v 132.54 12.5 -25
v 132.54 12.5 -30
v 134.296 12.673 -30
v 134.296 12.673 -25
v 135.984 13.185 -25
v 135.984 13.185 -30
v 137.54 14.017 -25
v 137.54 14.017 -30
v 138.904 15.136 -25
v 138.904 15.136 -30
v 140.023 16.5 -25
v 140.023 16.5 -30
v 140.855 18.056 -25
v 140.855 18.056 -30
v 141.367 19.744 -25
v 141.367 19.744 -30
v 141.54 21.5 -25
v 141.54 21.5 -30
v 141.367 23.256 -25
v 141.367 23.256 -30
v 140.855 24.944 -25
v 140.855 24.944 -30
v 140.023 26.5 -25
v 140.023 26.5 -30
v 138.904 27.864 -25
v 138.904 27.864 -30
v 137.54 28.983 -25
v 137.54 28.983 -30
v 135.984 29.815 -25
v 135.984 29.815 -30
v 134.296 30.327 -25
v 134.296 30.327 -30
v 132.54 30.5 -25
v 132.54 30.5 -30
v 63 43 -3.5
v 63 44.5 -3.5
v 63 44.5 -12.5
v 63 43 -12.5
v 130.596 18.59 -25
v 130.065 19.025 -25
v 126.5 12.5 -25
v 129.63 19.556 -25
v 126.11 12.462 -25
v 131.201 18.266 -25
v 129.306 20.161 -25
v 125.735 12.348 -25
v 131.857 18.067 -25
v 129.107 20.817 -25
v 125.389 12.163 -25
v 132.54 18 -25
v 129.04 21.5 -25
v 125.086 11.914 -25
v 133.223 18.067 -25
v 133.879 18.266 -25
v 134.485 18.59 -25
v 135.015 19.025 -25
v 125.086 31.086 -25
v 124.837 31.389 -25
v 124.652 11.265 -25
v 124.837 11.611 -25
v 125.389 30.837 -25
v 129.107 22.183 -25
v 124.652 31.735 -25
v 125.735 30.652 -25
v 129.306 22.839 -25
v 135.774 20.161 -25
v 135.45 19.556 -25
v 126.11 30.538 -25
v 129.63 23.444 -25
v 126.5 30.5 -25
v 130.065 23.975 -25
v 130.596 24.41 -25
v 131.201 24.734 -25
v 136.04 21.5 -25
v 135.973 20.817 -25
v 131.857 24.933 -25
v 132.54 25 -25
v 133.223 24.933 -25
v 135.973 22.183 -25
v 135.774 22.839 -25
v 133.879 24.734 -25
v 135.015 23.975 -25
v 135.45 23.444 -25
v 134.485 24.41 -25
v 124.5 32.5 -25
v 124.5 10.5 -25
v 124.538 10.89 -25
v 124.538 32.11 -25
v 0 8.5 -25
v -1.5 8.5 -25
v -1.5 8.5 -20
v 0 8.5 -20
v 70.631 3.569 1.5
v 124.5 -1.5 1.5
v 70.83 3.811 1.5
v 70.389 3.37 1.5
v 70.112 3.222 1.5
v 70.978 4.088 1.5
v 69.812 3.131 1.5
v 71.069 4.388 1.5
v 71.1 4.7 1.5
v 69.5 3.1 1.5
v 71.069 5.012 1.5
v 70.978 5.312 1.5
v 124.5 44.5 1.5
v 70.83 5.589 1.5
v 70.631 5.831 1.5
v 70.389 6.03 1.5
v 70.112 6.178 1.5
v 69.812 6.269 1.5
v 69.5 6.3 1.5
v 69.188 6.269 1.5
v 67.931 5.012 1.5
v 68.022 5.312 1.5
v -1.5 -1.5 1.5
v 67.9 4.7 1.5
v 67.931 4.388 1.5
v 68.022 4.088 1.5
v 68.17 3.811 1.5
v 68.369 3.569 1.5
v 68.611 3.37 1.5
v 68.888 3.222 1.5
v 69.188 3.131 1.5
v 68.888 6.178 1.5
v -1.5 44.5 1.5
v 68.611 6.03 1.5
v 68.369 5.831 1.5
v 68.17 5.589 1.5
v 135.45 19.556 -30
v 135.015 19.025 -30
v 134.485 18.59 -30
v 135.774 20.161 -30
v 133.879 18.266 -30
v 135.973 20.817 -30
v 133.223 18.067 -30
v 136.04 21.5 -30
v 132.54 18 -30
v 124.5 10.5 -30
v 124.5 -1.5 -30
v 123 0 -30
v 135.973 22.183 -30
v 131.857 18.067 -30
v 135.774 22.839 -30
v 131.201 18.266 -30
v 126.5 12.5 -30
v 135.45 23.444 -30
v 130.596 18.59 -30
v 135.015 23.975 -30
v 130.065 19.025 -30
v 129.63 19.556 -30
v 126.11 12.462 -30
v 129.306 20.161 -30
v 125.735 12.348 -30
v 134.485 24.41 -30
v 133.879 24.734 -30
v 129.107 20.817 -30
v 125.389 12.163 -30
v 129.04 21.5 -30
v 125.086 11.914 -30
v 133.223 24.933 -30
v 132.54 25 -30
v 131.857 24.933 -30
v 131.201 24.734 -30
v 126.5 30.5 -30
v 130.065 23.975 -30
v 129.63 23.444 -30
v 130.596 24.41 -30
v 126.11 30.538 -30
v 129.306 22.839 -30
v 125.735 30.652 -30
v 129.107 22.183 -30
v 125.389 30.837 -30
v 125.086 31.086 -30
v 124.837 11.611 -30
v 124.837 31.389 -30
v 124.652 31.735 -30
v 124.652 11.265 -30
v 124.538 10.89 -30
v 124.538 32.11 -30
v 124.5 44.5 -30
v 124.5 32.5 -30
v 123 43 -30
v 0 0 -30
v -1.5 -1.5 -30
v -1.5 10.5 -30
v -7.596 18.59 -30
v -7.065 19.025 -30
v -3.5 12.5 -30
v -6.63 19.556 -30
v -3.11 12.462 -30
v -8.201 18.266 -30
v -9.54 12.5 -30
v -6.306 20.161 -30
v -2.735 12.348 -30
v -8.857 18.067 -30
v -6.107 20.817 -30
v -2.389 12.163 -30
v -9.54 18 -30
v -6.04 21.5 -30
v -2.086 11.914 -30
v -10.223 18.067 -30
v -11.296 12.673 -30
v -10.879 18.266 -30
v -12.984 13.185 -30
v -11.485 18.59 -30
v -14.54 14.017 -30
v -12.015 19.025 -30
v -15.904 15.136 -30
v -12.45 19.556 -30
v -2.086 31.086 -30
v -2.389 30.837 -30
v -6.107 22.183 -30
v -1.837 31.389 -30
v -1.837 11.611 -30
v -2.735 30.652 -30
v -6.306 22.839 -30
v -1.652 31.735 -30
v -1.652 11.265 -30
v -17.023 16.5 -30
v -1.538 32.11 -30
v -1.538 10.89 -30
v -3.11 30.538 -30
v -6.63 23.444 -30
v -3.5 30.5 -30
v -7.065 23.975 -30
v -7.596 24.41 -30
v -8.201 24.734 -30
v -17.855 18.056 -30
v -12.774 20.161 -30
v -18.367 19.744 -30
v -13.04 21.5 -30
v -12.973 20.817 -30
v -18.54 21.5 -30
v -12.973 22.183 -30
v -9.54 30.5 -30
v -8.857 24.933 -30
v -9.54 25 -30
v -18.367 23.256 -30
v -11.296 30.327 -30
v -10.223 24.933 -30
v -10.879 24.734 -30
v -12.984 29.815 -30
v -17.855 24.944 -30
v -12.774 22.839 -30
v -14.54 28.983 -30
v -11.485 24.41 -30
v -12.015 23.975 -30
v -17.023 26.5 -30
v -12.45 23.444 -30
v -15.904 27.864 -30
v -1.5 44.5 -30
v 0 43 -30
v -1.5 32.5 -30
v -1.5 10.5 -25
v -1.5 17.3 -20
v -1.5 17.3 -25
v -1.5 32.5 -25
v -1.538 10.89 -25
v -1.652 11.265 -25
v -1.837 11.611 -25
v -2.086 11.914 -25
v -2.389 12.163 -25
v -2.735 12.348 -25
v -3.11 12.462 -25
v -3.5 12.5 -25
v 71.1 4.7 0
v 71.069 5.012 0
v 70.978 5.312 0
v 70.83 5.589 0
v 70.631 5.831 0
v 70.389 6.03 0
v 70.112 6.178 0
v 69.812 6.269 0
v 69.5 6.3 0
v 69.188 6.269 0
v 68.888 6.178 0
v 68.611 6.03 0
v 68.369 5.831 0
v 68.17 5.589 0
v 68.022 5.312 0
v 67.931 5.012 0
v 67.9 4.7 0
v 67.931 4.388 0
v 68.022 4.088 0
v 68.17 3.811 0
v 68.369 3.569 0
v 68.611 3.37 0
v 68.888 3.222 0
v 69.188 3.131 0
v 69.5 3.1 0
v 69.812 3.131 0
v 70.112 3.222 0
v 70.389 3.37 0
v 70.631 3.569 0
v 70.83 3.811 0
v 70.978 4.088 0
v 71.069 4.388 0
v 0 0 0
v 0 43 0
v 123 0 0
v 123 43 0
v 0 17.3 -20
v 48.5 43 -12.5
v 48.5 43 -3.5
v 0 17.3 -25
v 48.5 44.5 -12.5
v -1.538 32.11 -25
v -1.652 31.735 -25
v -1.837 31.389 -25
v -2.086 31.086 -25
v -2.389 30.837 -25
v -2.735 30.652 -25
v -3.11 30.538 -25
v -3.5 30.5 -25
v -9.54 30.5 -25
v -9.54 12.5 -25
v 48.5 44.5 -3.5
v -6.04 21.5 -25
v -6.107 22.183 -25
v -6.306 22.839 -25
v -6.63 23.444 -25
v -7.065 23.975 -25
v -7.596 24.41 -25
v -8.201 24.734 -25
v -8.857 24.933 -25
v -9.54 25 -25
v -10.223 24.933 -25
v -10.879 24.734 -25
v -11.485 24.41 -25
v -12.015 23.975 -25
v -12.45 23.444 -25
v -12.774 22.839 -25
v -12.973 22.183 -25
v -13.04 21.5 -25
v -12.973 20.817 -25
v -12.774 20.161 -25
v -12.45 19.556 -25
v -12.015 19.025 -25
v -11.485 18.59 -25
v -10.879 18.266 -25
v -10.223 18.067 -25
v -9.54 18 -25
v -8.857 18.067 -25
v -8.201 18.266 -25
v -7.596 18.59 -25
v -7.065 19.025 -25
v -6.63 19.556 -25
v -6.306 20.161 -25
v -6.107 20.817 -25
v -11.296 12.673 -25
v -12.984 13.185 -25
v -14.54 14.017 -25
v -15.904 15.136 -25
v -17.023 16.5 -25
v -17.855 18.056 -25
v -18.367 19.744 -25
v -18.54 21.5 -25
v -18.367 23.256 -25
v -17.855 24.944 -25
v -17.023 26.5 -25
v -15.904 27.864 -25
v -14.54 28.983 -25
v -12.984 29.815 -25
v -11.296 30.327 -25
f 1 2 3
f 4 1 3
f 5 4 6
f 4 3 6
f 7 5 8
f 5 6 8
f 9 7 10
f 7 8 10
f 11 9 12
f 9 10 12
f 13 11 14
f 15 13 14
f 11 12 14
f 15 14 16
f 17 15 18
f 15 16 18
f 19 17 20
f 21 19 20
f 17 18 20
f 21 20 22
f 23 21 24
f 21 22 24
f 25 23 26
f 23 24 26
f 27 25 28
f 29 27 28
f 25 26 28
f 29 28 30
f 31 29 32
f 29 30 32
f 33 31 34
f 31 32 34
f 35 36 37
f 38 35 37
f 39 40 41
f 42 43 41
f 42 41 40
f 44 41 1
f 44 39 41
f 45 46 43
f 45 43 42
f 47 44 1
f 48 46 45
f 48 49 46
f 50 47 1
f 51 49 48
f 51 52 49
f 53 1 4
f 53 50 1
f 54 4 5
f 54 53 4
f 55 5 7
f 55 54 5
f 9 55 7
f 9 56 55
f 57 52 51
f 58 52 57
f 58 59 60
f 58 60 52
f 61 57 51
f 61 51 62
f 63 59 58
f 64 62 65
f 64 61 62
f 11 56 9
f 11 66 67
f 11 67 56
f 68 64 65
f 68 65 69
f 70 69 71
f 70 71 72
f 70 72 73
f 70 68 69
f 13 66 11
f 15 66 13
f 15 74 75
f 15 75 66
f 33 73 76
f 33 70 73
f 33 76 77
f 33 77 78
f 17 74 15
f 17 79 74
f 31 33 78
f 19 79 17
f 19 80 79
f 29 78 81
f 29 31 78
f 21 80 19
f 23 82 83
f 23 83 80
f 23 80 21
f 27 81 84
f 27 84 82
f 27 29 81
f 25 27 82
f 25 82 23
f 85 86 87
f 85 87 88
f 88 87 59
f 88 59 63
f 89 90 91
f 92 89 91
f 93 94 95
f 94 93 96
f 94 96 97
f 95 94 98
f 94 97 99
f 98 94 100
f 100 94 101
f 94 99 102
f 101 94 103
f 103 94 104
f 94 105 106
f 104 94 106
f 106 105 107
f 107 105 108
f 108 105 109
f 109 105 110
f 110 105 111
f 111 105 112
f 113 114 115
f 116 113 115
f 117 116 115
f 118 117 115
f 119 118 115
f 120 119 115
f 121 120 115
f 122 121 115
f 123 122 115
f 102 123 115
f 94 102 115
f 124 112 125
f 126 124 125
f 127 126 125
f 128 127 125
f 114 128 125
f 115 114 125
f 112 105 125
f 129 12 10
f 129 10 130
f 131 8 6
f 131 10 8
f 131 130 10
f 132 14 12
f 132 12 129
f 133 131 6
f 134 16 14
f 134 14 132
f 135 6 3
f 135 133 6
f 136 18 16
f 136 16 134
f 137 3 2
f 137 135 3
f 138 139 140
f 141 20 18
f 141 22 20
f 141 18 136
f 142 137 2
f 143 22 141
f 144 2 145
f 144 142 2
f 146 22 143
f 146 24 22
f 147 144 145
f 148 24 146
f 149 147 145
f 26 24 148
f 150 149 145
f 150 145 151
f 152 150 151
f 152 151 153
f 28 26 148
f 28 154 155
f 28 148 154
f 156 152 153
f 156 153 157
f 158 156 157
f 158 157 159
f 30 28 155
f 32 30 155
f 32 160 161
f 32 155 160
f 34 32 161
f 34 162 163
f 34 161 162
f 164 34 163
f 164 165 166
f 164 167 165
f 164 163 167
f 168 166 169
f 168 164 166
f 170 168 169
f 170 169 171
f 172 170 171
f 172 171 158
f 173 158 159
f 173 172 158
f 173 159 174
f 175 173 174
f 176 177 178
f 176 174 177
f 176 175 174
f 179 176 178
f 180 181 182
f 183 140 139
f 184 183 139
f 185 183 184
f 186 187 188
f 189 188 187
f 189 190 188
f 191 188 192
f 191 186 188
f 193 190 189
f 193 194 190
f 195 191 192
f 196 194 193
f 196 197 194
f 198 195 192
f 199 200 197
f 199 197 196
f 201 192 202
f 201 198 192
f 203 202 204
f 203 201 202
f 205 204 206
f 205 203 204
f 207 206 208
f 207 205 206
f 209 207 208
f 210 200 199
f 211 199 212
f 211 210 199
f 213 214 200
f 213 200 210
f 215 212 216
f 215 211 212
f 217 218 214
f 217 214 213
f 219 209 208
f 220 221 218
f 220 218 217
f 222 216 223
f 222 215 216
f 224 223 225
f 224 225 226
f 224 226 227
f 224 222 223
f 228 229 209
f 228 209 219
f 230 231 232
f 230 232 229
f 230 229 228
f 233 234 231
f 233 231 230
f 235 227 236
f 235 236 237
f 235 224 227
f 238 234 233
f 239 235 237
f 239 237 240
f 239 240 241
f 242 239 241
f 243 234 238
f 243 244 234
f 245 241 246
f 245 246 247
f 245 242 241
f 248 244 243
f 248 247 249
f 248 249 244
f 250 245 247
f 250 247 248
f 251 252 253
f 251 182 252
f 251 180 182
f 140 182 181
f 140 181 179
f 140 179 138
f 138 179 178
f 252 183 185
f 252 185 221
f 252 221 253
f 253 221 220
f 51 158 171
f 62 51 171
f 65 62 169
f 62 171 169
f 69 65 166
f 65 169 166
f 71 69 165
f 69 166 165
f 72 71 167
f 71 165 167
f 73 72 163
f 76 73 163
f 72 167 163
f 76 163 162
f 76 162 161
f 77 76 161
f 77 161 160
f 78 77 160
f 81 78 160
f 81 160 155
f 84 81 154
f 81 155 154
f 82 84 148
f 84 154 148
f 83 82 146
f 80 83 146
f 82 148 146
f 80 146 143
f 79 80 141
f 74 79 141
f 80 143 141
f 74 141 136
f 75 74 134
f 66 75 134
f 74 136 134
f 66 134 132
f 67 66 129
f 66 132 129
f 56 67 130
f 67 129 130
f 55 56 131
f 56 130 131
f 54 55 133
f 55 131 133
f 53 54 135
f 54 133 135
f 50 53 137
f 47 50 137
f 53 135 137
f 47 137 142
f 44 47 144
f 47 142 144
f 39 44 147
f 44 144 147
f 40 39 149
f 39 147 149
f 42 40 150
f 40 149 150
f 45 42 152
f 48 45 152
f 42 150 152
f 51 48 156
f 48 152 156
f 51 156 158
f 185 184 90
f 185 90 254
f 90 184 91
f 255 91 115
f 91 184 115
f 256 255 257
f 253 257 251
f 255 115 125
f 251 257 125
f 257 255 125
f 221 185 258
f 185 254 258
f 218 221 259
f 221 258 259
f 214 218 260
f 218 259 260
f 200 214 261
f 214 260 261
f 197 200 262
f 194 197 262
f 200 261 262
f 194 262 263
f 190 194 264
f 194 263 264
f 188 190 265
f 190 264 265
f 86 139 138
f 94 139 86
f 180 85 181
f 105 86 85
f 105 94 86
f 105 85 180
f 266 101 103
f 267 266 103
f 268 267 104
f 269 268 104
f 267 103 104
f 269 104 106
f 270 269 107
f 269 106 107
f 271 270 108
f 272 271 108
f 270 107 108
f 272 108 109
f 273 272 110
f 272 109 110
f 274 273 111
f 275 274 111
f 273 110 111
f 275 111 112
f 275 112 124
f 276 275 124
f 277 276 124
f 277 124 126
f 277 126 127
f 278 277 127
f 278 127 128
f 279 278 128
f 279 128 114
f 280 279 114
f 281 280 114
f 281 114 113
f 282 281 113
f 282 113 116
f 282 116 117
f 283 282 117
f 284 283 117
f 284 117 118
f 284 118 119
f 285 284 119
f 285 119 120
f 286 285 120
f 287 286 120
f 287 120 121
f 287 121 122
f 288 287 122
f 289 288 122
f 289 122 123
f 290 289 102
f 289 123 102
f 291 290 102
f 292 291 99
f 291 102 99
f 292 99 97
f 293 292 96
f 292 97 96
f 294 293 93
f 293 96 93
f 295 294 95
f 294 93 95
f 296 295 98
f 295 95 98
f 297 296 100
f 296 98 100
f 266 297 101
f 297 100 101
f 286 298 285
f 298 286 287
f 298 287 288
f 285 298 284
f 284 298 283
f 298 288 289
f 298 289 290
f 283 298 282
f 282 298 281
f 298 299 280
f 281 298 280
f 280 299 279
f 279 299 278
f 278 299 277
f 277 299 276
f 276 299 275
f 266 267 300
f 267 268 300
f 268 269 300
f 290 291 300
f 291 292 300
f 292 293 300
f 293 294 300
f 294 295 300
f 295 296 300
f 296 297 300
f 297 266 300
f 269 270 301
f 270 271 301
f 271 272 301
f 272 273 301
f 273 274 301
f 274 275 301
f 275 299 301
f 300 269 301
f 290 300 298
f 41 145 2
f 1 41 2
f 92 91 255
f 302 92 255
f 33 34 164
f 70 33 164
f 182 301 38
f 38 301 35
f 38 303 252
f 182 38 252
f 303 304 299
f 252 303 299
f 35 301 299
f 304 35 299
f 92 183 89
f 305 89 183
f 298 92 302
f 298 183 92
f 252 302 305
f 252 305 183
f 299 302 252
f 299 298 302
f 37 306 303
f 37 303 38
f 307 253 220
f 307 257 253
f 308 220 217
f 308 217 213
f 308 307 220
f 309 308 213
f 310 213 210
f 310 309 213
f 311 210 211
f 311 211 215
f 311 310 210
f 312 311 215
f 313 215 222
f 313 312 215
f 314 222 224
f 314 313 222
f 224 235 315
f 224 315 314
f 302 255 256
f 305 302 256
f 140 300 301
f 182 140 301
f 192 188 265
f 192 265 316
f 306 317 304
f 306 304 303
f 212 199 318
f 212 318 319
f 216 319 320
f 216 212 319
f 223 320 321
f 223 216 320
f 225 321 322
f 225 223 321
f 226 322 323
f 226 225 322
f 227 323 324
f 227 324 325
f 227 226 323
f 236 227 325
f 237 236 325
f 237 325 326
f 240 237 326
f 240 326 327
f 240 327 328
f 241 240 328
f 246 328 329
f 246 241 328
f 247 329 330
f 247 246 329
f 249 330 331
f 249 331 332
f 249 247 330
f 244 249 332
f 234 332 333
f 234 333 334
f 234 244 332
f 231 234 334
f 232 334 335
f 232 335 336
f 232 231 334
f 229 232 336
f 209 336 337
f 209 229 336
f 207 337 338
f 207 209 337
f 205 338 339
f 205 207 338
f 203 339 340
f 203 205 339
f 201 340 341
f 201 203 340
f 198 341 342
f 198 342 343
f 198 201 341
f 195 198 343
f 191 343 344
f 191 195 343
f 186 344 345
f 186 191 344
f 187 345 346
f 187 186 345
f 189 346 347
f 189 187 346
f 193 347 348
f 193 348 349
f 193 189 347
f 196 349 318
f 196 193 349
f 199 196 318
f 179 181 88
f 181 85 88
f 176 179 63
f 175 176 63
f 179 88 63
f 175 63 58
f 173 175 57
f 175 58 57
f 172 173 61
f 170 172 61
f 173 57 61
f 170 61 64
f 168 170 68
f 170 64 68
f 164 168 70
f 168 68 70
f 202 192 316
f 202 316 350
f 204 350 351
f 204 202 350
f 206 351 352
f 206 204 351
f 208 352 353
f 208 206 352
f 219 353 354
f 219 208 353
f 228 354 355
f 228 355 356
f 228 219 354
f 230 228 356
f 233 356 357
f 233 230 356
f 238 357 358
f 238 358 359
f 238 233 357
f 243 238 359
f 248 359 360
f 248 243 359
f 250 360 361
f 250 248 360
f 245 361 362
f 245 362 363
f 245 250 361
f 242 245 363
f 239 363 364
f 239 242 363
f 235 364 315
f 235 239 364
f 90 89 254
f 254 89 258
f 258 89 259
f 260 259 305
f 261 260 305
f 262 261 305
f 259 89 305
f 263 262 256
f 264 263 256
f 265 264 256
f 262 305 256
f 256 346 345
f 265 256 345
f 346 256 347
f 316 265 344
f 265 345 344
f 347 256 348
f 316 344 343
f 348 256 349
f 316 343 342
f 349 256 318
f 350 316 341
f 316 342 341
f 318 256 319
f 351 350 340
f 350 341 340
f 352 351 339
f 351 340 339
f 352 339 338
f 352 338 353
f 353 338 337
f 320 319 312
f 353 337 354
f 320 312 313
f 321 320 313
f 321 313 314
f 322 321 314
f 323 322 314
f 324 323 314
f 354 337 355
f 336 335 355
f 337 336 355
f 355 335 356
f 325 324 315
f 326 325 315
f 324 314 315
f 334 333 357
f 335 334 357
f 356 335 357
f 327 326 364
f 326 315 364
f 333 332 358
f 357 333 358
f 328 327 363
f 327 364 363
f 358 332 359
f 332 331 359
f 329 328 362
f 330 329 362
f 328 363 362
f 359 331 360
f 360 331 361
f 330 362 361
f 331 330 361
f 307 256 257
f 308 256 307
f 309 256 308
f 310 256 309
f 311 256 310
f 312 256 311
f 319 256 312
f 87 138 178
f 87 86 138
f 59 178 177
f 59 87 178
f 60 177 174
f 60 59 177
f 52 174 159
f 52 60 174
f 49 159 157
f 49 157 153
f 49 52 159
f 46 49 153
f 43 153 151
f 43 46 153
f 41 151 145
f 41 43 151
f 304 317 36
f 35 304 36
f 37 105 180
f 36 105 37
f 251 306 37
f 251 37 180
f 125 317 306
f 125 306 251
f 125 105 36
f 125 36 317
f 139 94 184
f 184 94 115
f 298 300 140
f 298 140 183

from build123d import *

# Parameters (mm, degrees)
SKETCH_1_W           = 123
SKETCH_1_H           = 43
EXTRUDE_1_DEPTH      = 1.5
EXTRUDE_2_DEPTH      = 30
EXTRUDE_2_DEPTH_BACK = 1.5
SKETCH_2_W           = 126
SKETCH_2_H           = 46
SKETCH_2_W_2         = 123
SKETCH_2_H_2         = 43
SKETCH_3_R           = 3.5
EXTRUDE_3_DEPTH      = 5
SKETCH_5_R           = 1.6
CUT_EXTRUDE_1_DEPTH  = 10
CUT_EXTRUDE_2_DEPTH  = 10
SKETCH_7_W           = 14.5
SKETCH_7_H           = 9
CUT_EXTRUDE_3_DEPTH  = 10
FILLET_1_R           = 2


with BuildPart() as part:
    # Эскиз1 → Бобышка-Вытянуть1 (new body)
    with BuildSketch(Plane.XY):
        with Locations((61.5, 21.5)):
            Rectangle(SKETCH_1_W, SKETCH_1_H)
    extrude(amount=EXTRUDE_1_DEPTH)

    # Эскиз2 → Бобышка-Вытянуть2 (add, two sides: drawn at the far end of the back side and taken through both)
    with BuildSketch(Plane(origin=(0, 0, 0), x_dir=(-1, 0, 0), z_dir=(0, 0, -1)).offset(-EXTRUDE_2_DEPTH_BACK)):
        with Locations((-61.5, 21.5)):
            Rectangle(SKETCH_2_W, SKETCH_2_H)
        with Locations((-61.5, 21.5)):
            Rectangle(SKETCH_2_W_2, SKETCH_2_H_2, mode=Mode.SUBTRACT)
    extrude(amount=EXTRUDE_2_DEPTH + EXTRUDE_2_DEPTH_BACK)

    # Эскиз3 → Бобышка-Вытянуть3 (add)
    with BuildSketch(Plane(origin=(0, 0, -30), x_dir=(-1, 0, 0), z_dir=(0, 0, -1))):
        with BuildLine():
            Line((-124.5, 12.5), (-132.54002612, 12.5))
            ThreePointArc((-132.54002612, 12.5), (-141.54002612, 21.5), (-132.54002612, 30.5))
            Line((-132.54002612, 30.5), (-124.5, 30.5))
            Line((-124.5, 30.5), (-124.5, 12.5))
        make_face()
        with Locations((-132.54002612, 21.5)):
            Circle(SKETCH_3_R, mode=Mode.SUBTRACT)
    extrude_3 = extrude(amount=-EXTRUDE_3_DEPTH)

    # Зеркальное отражение1: Бобышка-Вытянуть3 across plane
    add(extrude_3.mirror(Plane(origin=(61.5, 0, 0), x_dir=(0, 0, 1), z_dir=(1, 0, 0))))

    # Эскиз5 → Вырез-Вытянуть1 (cut)
    with BuildSketch(Plane.XY.offset(1.5)):
        with Locations((69.5, 4.7)):
            Circle(SKETCH_5_R)
    extrude(amount=-CUT_EXTRUDE_1_DEPTH, mode=Mode.SUBTRACT)

    # Эскиз6 → Вырез-Вытянуть2 (cut)
    with BuildSketch(Plane.ZY.offset(1.5)):
        Polygon((-20, 17.3), (-22.5, 17.3), (-25, 17.3), (-25, 16.65), (-25, 9.65), (-25, 8.5), (-22.5, 8.5), (-20, 8.5), align=None)
    extrude(amount=-CUT_EXTRUDE_2_DEPTH, mode=Mode.SUBTRACT)

    # Эскиз7 → Вырез-Вытянуть3 (cut)
    with BuildSketch(Plane(origin=(0, 44.5, 0), x_dir=(1, 0, 0), z_dir=(0, 1, 0))):
        with Locations((55.75, 8)):
            Rectangle(SKETCH_7_W, SKETCH_7_H)
    extrude(amount=-CUT_EXTRUDE_3_DEPTH, mode=Mode.SUBTRACT)

    # Скругление1
    fillet_1_edges = [part.edges().sort_by_distance(p)[0] for p in [
        (124.5, 30.5, -27.5),
        (124.5, 12.5, -27.5),
        (-1.5, 12.5, -27.5),
        (-1.5, 30.5, -27.5),
    ]]
    fillet(fillet_1_edges, radius=FILLET_1_R)


solid = part.part
